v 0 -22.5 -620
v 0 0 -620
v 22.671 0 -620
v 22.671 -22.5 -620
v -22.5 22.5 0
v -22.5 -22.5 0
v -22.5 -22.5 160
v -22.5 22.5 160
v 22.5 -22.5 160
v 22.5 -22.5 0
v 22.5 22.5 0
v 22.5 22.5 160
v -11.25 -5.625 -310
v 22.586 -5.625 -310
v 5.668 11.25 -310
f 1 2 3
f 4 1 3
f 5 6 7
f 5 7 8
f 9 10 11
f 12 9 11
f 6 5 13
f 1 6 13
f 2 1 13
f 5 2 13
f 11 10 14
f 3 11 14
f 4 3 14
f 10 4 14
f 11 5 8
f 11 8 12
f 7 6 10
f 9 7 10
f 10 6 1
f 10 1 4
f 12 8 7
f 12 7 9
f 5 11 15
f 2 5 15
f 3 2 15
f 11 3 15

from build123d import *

# Parameters (mm, degrees)
F0_W     = 45
F0_H     = 45
F2_W     = 22.671414
F2_H     = 22.5
F4_DEPTH = 160


with BuildPart() as f3:
    # F0 (on Top) → F3 section 0
    with BuildSketch(Plane.XY):
        Rectangle(F0_W, F0_H)
    # F2 (on offset) → F3 section 1
    with BuildSketch(Plane.XY.offset(-620)):
        with Locations((11.335707, -11.25)):
            Rectangle(F2_W, F2_H)
    loft()

    # F0 (on Top) → F4 (join)
    with BuildSketch(Plane.XY):
        Rectangle(F0_W, F0_H)
    extrude(amount=F4_DEPTH)


solid = f3.part
